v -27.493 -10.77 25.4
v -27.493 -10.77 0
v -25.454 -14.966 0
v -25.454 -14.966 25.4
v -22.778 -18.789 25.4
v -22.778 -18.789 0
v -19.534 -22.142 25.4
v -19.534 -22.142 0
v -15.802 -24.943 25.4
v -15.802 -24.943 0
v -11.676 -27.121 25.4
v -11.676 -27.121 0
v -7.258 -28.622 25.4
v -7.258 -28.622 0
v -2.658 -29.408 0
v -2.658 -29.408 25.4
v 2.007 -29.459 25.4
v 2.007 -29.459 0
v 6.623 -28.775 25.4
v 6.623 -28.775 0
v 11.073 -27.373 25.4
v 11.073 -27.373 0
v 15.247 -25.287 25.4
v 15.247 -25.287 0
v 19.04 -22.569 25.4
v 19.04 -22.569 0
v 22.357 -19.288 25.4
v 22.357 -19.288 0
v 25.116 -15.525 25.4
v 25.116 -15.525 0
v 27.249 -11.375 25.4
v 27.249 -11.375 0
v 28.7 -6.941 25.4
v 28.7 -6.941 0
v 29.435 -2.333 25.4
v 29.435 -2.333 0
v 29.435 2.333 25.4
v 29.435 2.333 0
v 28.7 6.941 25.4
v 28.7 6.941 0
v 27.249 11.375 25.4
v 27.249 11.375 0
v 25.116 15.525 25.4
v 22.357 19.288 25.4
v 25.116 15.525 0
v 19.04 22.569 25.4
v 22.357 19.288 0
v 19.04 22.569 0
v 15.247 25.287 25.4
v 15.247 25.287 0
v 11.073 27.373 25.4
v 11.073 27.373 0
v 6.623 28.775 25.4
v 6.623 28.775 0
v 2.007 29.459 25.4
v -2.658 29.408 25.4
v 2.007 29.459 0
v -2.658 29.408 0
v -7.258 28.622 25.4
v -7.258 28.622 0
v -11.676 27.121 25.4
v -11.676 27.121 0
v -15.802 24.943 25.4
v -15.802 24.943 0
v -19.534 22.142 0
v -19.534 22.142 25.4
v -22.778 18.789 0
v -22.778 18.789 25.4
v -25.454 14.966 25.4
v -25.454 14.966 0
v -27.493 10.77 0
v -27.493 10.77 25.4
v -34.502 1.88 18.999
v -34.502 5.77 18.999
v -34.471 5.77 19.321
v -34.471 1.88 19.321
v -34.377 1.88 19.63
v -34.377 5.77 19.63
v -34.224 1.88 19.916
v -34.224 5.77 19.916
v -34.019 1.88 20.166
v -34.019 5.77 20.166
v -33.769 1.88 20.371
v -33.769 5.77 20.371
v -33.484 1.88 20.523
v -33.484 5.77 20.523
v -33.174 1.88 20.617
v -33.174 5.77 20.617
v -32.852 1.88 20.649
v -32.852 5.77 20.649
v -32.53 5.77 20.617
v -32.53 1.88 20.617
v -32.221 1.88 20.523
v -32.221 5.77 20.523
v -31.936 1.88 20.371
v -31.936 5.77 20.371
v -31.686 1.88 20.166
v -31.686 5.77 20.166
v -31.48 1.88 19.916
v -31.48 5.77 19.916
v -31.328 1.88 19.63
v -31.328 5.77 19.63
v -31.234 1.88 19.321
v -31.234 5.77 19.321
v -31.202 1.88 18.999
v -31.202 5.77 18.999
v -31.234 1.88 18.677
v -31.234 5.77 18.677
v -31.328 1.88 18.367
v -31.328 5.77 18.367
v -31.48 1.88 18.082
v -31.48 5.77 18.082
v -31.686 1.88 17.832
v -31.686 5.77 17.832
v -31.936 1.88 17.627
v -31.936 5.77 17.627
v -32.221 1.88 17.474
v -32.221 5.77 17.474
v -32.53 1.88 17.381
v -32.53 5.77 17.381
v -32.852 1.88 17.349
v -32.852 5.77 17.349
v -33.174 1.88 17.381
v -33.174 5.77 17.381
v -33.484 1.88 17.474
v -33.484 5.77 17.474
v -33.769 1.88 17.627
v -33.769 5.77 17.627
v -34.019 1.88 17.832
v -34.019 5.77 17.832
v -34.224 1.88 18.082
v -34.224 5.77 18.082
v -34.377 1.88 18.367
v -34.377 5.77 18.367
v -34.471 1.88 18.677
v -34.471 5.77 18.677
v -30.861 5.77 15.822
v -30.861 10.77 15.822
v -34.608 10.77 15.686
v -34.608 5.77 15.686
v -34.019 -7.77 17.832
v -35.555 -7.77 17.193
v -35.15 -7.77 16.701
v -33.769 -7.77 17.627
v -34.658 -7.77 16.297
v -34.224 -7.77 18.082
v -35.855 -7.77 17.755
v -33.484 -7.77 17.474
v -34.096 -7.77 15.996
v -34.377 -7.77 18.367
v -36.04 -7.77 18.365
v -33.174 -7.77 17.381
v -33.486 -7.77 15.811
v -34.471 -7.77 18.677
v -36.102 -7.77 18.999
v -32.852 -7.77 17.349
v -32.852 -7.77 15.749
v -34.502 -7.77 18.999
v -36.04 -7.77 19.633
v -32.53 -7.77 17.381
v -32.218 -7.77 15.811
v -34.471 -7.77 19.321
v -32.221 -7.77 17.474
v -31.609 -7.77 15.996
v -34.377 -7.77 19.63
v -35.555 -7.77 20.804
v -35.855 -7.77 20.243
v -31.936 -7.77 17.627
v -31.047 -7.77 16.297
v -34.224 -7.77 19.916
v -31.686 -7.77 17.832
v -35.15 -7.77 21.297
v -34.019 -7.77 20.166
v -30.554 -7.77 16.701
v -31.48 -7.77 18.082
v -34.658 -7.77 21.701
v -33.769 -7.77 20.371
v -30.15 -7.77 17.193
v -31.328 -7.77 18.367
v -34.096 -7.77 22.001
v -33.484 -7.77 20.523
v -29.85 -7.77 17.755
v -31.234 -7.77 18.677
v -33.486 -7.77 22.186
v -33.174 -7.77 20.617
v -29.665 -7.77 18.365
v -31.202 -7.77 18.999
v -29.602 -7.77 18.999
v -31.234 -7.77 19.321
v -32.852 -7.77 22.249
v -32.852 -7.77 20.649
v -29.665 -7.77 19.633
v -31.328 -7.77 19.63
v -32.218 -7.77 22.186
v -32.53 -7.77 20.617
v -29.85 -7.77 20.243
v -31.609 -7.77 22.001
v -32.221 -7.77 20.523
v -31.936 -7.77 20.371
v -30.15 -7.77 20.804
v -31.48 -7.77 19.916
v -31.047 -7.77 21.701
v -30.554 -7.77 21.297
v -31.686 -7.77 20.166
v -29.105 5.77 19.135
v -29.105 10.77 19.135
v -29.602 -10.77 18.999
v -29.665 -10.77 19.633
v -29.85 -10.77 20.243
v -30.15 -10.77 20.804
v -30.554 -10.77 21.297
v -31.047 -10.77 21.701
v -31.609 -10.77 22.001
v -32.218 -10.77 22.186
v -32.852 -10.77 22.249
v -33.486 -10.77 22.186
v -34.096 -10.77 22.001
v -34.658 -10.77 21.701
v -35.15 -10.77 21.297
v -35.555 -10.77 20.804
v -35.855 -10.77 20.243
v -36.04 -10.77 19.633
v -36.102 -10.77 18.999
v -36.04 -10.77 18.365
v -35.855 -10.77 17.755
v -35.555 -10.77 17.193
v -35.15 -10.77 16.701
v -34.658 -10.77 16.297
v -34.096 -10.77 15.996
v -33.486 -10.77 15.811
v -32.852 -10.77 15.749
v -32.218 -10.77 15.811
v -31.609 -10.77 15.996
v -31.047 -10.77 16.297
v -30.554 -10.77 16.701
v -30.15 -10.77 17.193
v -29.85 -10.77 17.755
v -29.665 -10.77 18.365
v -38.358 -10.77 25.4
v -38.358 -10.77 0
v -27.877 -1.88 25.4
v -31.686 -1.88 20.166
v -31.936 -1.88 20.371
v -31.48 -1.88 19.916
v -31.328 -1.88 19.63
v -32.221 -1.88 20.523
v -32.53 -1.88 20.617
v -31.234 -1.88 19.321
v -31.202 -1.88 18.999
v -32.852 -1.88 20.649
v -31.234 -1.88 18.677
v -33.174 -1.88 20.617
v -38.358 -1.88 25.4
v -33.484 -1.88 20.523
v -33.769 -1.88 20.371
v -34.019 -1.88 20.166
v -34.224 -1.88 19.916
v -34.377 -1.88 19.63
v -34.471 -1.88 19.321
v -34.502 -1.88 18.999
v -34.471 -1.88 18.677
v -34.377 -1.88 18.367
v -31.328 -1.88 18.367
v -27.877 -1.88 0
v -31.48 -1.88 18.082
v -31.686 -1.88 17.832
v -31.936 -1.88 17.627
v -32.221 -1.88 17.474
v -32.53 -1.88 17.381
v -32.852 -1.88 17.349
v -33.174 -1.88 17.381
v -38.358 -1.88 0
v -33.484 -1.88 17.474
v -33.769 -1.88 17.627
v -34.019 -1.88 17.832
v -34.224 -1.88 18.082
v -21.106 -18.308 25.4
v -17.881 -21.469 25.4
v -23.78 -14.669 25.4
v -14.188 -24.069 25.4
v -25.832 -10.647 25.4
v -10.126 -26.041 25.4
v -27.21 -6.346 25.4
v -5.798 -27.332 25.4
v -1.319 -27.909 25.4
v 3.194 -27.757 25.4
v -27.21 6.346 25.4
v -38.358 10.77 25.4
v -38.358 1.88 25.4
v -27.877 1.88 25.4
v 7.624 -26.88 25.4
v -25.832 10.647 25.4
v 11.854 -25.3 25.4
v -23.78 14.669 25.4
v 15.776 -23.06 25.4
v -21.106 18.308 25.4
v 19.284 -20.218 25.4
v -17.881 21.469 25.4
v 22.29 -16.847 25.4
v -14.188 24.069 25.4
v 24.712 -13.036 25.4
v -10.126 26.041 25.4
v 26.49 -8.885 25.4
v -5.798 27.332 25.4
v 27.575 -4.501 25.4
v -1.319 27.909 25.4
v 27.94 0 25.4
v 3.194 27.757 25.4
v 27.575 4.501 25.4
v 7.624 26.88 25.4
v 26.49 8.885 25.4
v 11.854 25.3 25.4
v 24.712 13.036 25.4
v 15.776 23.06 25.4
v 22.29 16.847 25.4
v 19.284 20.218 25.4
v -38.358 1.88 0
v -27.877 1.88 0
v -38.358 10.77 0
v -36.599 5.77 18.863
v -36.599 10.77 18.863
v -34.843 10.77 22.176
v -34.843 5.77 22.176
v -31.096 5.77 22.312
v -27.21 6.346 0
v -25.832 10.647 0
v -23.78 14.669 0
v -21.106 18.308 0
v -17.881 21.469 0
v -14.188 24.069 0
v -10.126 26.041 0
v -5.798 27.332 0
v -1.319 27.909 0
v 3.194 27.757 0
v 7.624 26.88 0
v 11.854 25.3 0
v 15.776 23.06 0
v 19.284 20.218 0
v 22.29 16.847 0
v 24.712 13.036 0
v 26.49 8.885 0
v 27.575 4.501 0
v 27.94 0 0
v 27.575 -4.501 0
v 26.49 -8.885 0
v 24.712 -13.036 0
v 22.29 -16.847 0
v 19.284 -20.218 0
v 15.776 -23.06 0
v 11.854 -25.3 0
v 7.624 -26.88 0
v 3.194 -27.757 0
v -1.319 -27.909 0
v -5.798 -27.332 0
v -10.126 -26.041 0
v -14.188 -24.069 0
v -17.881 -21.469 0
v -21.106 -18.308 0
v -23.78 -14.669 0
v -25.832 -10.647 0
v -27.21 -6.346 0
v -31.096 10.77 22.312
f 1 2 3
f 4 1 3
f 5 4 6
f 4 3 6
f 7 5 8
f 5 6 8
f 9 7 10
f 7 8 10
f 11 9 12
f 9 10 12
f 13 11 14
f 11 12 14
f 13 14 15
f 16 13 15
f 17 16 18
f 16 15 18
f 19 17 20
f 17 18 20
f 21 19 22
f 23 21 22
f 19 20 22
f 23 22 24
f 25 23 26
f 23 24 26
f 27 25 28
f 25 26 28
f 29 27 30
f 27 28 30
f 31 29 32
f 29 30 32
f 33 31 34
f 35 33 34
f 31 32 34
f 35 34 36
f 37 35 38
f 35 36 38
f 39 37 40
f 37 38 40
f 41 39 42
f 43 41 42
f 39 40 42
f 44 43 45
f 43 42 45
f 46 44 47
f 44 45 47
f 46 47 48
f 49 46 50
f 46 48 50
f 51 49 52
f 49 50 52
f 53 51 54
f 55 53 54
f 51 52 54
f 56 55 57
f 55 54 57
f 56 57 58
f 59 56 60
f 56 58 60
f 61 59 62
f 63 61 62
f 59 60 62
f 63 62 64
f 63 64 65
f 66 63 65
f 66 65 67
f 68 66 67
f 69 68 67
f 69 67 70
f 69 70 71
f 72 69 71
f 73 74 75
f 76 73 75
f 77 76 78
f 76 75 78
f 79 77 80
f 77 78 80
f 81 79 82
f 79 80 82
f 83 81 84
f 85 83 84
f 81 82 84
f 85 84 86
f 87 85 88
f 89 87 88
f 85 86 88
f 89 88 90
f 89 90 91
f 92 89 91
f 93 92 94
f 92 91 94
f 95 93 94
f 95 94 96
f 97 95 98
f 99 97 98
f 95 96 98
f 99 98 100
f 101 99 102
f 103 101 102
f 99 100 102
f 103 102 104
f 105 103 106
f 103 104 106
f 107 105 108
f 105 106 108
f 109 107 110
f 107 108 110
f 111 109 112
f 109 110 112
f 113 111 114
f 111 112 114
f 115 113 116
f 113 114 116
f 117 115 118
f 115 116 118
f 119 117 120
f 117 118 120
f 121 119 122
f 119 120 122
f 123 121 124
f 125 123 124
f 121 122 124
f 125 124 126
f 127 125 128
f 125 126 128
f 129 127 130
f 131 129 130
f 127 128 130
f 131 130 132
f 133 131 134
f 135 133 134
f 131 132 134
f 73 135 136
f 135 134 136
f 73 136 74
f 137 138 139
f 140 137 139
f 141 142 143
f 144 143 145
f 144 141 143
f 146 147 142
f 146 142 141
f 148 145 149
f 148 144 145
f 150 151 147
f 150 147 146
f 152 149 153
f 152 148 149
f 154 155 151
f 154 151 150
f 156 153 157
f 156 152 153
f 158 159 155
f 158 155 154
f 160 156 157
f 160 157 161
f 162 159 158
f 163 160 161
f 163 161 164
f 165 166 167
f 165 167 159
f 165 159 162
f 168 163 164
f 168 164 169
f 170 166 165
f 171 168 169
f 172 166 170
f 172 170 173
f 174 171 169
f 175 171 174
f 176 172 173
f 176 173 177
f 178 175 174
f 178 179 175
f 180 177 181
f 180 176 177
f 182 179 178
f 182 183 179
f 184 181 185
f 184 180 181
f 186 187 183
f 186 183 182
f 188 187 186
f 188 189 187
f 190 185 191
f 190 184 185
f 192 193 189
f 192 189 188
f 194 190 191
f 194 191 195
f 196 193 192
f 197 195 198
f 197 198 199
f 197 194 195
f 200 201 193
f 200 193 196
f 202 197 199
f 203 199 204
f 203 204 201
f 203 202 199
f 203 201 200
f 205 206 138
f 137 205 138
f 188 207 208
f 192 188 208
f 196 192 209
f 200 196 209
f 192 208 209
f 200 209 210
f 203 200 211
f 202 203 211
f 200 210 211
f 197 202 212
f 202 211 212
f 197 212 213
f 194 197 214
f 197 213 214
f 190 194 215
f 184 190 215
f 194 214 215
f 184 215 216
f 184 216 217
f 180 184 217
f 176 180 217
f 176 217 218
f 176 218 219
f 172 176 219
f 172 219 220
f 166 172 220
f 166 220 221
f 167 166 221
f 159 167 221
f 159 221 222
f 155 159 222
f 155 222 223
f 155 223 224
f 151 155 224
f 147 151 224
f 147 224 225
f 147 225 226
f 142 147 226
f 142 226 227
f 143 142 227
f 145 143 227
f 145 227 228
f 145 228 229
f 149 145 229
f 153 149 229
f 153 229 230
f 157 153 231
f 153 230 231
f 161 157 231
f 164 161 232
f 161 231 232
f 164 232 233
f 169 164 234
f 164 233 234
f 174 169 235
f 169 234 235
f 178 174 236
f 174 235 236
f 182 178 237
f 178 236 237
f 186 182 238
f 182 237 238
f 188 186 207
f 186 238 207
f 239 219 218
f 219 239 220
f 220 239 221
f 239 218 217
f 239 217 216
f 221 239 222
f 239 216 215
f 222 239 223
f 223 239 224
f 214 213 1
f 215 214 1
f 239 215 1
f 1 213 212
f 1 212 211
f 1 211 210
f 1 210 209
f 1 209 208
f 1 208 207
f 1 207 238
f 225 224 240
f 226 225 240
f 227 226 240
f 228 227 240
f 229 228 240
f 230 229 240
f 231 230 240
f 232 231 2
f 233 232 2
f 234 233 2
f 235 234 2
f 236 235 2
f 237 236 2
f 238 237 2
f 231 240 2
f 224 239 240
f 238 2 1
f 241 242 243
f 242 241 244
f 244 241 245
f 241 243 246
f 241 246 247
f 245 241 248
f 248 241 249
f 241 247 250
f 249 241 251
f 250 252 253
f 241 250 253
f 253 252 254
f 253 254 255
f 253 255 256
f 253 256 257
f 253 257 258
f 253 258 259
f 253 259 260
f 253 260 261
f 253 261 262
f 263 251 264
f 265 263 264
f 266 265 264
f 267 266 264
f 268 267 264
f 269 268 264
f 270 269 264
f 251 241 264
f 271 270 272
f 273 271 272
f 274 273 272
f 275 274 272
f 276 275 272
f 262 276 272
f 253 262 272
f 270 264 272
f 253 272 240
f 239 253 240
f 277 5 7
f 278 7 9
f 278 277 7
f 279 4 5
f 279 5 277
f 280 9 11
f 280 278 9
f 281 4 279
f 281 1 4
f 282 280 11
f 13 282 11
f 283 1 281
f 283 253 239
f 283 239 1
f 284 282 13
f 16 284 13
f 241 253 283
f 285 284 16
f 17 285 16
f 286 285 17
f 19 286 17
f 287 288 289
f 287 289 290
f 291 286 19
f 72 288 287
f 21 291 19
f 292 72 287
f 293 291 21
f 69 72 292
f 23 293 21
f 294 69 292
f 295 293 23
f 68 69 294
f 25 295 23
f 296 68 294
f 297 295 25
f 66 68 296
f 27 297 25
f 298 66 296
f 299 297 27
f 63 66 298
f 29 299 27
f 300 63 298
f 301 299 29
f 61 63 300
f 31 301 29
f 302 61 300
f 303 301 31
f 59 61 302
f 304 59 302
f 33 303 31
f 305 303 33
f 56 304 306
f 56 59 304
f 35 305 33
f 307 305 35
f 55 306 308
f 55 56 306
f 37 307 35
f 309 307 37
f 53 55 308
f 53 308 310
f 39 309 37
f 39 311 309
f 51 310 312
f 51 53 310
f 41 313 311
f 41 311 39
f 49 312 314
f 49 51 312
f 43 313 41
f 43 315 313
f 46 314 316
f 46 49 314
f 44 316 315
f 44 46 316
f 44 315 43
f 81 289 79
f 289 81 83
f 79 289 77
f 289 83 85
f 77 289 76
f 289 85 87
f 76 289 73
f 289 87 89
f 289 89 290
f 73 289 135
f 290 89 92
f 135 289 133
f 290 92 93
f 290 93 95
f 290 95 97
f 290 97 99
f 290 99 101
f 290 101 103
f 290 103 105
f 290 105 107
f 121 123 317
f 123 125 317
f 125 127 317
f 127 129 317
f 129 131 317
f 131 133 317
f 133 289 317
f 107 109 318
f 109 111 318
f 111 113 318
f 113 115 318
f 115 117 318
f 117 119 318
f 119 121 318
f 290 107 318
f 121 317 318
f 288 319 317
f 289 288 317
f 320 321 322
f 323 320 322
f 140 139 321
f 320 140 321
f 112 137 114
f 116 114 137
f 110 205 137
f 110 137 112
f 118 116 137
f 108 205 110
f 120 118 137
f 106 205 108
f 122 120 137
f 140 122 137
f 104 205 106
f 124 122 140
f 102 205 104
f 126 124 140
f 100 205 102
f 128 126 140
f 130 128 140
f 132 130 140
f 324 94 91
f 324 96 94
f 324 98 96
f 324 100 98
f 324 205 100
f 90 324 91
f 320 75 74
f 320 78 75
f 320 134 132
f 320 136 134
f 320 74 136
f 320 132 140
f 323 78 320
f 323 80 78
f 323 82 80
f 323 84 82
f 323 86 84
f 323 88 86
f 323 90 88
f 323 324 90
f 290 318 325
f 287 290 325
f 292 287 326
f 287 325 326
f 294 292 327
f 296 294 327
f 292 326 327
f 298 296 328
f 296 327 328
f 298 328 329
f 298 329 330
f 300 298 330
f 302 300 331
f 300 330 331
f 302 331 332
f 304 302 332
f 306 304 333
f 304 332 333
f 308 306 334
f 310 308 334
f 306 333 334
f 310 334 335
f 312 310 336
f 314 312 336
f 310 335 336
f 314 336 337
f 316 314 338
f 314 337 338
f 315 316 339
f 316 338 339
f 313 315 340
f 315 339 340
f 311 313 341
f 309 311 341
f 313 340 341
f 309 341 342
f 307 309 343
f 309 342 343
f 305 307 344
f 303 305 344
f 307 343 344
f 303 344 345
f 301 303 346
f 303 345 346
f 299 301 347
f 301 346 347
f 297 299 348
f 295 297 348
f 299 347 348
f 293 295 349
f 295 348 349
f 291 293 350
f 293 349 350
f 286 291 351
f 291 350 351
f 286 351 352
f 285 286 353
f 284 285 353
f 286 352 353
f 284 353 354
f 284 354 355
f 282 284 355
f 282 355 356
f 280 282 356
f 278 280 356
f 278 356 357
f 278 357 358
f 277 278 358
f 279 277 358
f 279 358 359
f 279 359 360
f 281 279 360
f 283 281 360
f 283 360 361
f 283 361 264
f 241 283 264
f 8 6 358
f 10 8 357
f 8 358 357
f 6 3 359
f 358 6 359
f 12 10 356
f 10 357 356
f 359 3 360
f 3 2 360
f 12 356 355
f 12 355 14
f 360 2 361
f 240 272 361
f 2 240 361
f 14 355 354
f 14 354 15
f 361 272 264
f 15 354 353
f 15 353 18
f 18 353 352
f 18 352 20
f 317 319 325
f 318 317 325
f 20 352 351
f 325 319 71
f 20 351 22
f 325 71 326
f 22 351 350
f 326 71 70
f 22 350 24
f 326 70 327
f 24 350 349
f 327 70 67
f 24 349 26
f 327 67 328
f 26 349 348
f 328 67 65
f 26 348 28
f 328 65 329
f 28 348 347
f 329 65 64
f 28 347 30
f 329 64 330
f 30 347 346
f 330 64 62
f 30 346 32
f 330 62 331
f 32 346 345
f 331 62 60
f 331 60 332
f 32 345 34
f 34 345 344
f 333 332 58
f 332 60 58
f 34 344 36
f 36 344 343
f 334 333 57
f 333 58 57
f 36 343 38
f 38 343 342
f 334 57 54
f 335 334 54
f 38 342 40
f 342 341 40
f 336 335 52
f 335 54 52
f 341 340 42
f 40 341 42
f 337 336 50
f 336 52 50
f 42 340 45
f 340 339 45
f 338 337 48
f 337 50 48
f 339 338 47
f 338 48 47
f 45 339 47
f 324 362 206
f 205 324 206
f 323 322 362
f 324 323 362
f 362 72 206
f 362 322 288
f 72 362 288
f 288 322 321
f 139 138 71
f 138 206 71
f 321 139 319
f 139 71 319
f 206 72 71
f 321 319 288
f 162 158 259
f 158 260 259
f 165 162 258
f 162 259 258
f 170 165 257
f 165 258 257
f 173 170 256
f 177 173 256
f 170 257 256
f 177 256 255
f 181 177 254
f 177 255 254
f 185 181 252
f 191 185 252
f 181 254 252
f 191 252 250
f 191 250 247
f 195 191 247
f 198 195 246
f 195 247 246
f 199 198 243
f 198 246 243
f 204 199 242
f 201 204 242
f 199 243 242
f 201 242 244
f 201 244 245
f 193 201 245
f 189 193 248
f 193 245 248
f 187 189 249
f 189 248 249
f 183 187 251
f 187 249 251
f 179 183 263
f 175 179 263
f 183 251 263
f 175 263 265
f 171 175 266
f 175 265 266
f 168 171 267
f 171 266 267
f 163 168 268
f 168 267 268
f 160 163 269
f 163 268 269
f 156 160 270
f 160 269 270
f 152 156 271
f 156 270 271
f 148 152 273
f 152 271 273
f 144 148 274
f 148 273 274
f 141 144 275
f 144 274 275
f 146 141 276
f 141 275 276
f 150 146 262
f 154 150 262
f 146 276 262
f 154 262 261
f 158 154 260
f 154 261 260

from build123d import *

# Parameters (mm, degrees)
F1_DEPTH       = 25.4
F3_D           = 3.3
F3_CBORE_D     = 6.5
F3_CBORE_DEPTH = 3
F5_DEPTH       = 5


with BuildPart() as f1:
    # F0 (on Top) → F1 (new body)
    with BuildSketch(Plane.XY):
        with BuildLine():
            ThreePointArc((-27.8767053979, 1.8796), (27.94, 0), (-27.8767053979, -1.8796))
            Line((-27.8767053979, -1.8796), (-29.4676154463, -1.8796))
            Line((-29.4676154463, -1.8796), (-38.3576154463, -1.8796))
            Line((-38.3576154463, -1.8796), (-38.3576154463, -10.7696))
            Line((-38.3576154463, -10.7696), (-29.4676154463, -10.7696))
            Line((-29.4676154463, -10.7696), (-27.4934350726, -10.7696))
            ThreePointArc((-27.4934350726, -10.7696), (29.5275, 0), (-27.4934350726, 10.7696))
            Line((-27.4934350726, 10.7696), (-29.4676154463, 10.7696))
            Line((-29.4676154463, 10.7696), (-38.3576154463, 10.7696))
            Line((-38.3576154463, 10.7696), (-38.3576154463, 1.8796))
            Line((-38.3576154463, 1.8796), (-29.4676154463, 1.8796))
            Line((-29.4676154463, 1.8796), (-27.8767053979, 1.8796))
        make_face()
    extrude(amount=F1_DEPTH)

    # F3 (through all)
    with Locations(Plane.XZ.offset(10.7696)):
        with Locations((-32.8522585332, 18.9988464117)):
            CounterBoreHole(F3_D / 2, F3_CBORE_D / 2, F3_CBORE_DEPTH)

    # F4 (on face) → F5 (cut)
    with BuildSketch(Plane(origin=(0, 10.7696, 0), x_dir=(-1, 0, 0), z_dir=(0, 1, 0))):
        Polygon((34.6081861546, 15.6860156038), (36.599217982, 18.8631089351), (34.8432903606, 22.175939743), (31.0963309118, 22.3116772196), (29.1052990845, 19.1345838883), (30.8612267059, 15.8217530804), align=None)
    extrude(amount=-F5_DEPTH, mode=Mode.SUBTRACT)


solid = f1.part
